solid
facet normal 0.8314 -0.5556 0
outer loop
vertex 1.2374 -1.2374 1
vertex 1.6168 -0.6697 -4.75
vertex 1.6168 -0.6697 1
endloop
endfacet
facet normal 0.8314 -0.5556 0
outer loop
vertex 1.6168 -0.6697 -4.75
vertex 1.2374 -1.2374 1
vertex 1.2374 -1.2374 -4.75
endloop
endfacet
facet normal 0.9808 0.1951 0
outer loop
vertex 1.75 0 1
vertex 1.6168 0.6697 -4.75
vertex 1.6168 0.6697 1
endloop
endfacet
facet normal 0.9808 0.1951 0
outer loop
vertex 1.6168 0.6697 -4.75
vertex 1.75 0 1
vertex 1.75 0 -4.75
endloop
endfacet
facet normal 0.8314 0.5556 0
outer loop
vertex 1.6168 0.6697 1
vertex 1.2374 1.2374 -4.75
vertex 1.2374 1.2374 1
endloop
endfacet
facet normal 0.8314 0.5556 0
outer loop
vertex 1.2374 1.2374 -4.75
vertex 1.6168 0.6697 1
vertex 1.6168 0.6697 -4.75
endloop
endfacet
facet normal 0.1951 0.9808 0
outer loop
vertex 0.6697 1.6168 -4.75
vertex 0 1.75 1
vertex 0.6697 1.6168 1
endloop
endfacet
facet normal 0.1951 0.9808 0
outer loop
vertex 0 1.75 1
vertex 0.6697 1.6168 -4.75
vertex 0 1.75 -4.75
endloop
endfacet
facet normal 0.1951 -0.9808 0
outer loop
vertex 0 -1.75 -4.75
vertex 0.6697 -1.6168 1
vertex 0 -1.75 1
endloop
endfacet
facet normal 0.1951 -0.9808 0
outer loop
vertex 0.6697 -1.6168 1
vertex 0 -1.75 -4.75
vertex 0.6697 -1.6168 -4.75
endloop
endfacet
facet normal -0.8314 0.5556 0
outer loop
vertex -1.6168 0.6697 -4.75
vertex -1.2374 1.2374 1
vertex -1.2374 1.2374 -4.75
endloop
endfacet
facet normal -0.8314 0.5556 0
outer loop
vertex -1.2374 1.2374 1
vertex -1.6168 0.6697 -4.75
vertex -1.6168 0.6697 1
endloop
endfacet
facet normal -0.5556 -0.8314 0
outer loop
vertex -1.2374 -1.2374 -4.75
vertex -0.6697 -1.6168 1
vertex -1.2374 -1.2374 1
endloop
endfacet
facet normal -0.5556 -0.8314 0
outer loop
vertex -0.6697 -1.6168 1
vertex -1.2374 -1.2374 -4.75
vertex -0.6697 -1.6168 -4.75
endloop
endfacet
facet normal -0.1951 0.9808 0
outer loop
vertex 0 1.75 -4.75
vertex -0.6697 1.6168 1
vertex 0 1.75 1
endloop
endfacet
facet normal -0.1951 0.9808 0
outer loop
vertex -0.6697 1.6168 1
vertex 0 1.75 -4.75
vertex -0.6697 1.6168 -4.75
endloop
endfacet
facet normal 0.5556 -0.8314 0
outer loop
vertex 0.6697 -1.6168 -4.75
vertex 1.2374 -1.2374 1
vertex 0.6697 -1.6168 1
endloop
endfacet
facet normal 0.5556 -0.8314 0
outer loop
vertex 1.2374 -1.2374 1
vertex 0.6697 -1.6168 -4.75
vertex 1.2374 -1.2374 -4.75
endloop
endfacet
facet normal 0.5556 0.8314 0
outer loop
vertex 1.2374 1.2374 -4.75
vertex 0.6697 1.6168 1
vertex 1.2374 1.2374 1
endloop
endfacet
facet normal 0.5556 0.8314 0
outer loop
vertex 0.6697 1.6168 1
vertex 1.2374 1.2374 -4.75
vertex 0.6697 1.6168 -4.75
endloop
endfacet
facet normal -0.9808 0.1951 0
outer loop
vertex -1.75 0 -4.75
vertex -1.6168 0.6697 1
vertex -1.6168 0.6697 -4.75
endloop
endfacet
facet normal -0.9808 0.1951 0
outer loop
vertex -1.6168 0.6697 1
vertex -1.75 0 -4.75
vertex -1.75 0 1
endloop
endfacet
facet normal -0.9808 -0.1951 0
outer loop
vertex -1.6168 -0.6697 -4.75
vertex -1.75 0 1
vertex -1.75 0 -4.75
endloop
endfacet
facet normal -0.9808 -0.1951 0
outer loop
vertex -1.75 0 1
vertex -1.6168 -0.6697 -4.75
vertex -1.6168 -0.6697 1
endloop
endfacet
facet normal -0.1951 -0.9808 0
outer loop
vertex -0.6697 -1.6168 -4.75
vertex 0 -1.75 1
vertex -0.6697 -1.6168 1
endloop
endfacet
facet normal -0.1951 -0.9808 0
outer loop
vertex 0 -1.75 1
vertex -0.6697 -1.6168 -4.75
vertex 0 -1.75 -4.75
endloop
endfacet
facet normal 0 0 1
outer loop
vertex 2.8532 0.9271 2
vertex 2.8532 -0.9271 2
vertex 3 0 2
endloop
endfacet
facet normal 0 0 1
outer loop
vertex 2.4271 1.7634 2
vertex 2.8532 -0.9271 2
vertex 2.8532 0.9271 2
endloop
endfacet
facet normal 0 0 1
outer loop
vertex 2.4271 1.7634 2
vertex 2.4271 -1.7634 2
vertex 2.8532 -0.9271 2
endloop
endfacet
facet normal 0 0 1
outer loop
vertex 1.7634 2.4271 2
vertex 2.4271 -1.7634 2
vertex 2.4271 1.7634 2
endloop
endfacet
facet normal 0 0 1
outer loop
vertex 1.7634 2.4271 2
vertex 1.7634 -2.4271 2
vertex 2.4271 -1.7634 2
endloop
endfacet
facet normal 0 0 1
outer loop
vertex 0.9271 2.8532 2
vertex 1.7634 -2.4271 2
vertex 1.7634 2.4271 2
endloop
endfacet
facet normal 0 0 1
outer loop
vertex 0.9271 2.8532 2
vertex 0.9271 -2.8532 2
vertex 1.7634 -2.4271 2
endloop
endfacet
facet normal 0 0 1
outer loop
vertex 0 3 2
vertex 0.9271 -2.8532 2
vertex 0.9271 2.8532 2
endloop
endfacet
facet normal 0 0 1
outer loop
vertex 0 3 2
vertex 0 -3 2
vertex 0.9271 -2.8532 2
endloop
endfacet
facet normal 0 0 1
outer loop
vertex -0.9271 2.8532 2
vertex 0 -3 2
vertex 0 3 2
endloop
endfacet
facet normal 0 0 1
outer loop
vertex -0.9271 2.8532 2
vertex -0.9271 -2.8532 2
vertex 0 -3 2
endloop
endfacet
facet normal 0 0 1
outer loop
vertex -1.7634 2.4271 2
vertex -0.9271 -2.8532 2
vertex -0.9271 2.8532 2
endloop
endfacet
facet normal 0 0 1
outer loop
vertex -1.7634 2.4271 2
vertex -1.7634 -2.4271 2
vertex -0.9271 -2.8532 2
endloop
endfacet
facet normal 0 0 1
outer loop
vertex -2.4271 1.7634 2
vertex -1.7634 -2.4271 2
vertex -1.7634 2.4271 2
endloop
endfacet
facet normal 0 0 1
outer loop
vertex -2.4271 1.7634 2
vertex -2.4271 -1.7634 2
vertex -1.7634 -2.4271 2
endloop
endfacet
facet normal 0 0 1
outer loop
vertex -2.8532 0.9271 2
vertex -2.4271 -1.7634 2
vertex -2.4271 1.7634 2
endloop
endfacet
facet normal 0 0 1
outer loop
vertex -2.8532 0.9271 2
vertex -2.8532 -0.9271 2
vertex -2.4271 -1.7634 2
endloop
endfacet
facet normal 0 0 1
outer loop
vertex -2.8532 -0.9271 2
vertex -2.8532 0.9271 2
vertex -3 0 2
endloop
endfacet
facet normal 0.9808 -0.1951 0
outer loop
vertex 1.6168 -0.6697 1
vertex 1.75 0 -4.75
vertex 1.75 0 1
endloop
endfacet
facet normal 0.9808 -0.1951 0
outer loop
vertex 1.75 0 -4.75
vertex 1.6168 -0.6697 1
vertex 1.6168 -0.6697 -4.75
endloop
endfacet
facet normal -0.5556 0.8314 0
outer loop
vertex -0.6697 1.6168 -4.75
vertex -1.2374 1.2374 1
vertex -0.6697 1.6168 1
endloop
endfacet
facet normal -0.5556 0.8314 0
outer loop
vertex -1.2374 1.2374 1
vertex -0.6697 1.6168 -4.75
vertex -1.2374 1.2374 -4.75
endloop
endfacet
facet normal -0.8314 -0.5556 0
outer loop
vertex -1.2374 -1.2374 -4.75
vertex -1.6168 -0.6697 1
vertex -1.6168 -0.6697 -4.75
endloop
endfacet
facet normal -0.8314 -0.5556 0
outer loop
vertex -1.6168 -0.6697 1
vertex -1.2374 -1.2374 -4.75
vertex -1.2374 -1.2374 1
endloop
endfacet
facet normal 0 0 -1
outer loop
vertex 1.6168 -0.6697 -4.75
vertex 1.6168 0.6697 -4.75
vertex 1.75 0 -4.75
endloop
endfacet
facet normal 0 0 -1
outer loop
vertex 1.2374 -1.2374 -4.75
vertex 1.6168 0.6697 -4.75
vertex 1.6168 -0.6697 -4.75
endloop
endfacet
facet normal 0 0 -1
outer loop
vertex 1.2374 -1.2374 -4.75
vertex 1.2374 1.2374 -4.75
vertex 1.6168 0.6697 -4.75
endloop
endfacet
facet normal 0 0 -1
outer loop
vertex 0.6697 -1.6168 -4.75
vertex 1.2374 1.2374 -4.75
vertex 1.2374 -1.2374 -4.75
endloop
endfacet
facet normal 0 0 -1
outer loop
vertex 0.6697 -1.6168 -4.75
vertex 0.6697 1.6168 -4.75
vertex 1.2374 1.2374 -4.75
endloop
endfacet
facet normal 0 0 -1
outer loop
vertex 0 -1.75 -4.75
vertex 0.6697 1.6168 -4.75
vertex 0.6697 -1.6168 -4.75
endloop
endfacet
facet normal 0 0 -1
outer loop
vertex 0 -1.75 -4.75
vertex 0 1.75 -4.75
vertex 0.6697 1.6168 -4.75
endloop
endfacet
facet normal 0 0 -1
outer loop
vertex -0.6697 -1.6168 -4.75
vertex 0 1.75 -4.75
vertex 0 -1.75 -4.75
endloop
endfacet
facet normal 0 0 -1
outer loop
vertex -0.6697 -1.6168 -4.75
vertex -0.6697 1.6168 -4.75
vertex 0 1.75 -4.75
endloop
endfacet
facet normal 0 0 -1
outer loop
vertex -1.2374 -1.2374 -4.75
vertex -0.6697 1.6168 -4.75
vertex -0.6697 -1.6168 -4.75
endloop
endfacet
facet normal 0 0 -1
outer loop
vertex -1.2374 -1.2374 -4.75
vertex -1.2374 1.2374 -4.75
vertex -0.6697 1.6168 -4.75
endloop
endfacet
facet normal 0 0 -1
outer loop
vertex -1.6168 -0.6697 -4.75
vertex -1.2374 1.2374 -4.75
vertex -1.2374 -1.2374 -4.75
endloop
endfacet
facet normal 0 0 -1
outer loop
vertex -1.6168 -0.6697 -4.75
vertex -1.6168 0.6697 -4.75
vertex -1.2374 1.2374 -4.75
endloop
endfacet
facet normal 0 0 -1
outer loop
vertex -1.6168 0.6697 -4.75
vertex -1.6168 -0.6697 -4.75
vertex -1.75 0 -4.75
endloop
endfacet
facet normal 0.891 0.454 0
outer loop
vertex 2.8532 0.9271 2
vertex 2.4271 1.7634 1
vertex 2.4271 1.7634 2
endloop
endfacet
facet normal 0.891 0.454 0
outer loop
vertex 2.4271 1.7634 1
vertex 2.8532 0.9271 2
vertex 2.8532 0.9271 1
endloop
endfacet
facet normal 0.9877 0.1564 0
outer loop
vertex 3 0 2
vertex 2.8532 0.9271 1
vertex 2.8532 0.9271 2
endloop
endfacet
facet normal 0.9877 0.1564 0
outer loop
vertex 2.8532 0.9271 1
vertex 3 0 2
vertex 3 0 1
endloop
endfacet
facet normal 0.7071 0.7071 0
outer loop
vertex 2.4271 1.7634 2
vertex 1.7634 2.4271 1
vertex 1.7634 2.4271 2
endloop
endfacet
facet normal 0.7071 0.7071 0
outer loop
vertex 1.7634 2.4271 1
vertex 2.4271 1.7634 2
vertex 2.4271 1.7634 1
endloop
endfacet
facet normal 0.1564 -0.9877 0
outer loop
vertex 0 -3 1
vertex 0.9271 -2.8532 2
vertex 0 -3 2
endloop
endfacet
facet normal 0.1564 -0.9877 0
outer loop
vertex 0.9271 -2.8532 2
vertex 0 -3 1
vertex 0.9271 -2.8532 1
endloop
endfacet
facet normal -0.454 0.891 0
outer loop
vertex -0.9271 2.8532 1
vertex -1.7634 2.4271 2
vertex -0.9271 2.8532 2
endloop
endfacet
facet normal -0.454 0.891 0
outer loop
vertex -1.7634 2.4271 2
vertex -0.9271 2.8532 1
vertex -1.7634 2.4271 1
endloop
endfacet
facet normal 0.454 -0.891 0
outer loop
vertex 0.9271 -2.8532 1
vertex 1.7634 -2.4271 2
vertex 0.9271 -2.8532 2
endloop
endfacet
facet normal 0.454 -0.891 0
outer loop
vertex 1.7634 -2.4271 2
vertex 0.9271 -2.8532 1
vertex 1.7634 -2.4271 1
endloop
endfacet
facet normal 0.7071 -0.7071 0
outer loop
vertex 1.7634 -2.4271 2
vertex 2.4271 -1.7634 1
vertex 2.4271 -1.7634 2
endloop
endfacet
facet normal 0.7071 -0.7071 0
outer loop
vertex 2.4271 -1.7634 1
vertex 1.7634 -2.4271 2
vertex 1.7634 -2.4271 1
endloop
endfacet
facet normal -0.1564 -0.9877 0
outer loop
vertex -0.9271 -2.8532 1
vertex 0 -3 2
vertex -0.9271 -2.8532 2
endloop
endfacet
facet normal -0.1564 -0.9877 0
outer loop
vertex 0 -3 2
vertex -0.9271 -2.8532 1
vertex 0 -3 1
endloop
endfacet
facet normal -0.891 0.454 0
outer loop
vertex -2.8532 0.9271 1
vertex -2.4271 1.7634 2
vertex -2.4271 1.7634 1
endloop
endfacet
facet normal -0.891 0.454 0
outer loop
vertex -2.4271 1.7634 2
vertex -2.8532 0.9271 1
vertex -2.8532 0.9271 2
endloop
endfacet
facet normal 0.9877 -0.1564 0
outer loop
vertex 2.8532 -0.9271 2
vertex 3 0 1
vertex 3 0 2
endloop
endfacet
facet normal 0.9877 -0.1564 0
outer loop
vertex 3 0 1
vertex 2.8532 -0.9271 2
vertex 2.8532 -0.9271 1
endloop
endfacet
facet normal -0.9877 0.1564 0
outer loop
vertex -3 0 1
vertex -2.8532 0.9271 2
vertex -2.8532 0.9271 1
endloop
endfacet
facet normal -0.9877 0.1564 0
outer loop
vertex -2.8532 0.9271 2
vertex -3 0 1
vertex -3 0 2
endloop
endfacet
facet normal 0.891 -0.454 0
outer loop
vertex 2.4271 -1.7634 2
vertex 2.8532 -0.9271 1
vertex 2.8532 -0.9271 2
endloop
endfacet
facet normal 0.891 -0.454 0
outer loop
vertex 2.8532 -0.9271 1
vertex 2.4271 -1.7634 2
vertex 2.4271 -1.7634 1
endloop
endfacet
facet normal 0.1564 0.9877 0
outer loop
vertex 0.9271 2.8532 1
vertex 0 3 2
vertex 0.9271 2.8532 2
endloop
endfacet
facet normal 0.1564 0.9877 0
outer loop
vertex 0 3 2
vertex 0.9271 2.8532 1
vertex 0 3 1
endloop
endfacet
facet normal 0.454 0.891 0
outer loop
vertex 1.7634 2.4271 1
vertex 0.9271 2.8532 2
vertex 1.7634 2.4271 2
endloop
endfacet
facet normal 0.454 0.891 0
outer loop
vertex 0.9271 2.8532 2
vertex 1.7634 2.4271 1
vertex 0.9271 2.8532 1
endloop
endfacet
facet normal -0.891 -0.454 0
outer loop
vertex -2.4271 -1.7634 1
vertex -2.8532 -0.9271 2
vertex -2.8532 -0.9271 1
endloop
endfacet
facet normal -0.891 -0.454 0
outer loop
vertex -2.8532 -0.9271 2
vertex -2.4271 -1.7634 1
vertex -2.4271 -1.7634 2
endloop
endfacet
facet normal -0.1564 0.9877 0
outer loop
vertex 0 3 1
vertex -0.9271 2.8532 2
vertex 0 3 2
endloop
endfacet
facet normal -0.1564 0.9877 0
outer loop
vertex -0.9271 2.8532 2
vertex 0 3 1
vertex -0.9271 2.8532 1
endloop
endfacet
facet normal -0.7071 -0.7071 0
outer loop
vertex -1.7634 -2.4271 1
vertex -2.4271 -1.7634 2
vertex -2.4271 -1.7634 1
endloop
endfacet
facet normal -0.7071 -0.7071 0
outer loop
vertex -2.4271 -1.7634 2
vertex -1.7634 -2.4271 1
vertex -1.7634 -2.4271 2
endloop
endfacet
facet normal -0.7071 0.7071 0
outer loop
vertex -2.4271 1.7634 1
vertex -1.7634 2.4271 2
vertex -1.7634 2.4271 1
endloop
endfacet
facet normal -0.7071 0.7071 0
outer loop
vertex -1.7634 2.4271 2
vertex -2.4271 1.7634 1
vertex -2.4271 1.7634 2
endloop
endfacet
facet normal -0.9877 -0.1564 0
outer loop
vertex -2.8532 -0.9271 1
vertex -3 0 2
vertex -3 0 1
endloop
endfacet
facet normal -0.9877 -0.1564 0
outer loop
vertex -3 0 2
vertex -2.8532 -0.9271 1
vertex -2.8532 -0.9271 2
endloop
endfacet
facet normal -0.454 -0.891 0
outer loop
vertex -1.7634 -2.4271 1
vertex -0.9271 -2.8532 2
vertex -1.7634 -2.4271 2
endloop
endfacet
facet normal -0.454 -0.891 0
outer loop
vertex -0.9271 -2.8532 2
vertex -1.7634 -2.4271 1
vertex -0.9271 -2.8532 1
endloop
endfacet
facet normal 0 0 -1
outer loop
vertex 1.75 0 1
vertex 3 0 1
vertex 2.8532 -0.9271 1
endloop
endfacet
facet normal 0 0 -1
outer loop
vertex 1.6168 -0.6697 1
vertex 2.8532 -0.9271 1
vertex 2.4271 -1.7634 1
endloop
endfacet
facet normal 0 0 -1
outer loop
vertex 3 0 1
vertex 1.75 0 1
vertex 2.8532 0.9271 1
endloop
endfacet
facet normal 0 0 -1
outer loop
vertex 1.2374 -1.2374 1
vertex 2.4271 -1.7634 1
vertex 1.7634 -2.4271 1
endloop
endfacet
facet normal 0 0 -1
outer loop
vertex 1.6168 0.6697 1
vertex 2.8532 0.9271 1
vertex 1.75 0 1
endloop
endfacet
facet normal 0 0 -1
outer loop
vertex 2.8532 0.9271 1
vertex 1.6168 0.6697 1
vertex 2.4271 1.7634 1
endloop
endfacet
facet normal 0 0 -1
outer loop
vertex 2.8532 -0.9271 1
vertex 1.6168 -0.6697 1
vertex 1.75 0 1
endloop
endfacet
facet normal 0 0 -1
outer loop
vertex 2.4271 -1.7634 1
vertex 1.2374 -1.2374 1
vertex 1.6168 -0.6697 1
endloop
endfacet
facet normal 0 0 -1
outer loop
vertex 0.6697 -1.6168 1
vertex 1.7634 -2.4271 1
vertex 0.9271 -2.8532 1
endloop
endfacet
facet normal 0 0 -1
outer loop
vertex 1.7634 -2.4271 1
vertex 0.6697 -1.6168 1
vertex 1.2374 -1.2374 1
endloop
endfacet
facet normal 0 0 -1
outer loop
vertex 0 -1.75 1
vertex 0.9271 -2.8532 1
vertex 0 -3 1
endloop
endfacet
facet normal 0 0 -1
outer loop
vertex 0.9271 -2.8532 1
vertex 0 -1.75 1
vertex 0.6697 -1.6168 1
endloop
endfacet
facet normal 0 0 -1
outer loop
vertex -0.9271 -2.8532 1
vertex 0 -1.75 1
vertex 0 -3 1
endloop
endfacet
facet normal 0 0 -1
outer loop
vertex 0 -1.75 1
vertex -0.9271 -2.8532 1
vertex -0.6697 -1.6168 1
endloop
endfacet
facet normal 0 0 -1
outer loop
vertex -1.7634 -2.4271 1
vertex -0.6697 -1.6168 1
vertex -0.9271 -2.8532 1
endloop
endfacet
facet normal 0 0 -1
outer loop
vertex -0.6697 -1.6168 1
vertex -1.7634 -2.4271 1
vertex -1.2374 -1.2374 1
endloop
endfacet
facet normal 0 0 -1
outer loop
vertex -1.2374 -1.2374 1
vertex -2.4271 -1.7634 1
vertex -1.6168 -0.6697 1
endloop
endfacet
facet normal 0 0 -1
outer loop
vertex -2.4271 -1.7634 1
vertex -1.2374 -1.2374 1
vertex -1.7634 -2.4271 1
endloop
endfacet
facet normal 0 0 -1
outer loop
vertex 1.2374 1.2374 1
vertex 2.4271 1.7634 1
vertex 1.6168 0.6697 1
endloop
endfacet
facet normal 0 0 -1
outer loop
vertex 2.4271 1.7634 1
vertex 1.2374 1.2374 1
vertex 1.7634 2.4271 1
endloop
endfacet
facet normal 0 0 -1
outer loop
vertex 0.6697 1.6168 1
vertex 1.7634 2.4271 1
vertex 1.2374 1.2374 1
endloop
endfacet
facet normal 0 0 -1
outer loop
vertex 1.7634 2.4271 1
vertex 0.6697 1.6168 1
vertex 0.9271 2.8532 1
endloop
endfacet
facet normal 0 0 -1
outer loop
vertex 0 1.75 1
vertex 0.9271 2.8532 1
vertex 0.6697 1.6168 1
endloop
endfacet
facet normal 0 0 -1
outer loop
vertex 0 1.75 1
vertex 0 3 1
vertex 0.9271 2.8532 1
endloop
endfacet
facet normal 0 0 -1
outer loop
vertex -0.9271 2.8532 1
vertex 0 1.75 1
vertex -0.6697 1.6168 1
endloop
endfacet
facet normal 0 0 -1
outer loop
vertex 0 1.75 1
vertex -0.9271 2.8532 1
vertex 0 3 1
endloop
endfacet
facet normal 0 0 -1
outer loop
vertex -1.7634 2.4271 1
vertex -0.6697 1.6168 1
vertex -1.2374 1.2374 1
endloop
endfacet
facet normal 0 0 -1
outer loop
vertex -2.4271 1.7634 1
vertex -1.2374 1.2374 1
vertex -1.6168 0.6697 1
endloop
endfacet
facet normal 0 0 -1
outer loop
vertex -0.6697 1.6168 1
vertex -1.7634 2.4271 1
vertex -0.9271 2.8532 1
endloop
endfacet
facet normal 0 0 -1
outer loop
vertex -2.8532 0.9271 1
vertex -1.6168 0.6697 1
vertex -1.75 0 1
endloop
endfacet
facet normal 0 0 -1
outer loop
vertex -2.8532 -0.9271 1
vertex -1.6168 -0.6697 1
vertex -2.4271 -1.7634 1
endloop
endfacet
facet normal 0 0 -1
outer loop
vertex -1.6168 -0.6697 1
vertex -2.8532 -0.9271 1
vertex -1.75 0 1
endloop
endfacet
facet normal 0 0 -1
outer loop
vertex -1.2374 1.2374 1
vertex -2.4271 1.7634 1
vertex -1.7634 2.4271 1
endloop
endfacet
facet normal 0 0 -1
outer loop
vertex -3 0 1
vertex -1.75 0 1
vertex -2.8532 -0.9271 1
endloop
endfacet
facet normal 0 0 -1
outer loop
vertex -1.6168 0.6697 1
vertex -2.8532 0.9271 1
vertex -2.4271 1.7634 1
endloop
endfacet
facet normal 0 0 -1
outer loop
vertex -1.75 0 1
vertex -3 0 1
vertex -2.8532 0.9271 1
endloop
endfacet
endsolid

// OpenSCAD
/*
difference() {
    union() {
        cube([12, 12, 10], center=true);
        translate([0, 0, 4])
            cube([20, 20, 2], center=true);
    }
    translate([0, 0, 1])
        cube([10, 10, 8], center=true);
    translate([0, 0, -4])
        cylinder(h=2, r=2, center=true, $fn=16);
    translate([7.5, 7.5, 4])
        con();
    translate([7.5, -7.5, 4])
        con();
    translate([-7.5, 7.5, 4])
        con();
    translate([-7.5, -7.5, 4])
        con();
}

translate([0, 0, -2.5]) {
    difference() {
        cylinder(h=5, r=3, center=true, $fn=16);
        cylinder(h=5, r=2, center=true, $fn=16);
    }
}

module con() {
    cylinder(h=2, r=1.1, center=true, $fn=16);
}
*/

translate([0, 0, -1.375])
    #cylinder(h=6.75, r=1.75, center=true, $fn=16);
translate([0, 0, 1.5])
    cylinder(h=1, r=3, center=true, $fn=20);
